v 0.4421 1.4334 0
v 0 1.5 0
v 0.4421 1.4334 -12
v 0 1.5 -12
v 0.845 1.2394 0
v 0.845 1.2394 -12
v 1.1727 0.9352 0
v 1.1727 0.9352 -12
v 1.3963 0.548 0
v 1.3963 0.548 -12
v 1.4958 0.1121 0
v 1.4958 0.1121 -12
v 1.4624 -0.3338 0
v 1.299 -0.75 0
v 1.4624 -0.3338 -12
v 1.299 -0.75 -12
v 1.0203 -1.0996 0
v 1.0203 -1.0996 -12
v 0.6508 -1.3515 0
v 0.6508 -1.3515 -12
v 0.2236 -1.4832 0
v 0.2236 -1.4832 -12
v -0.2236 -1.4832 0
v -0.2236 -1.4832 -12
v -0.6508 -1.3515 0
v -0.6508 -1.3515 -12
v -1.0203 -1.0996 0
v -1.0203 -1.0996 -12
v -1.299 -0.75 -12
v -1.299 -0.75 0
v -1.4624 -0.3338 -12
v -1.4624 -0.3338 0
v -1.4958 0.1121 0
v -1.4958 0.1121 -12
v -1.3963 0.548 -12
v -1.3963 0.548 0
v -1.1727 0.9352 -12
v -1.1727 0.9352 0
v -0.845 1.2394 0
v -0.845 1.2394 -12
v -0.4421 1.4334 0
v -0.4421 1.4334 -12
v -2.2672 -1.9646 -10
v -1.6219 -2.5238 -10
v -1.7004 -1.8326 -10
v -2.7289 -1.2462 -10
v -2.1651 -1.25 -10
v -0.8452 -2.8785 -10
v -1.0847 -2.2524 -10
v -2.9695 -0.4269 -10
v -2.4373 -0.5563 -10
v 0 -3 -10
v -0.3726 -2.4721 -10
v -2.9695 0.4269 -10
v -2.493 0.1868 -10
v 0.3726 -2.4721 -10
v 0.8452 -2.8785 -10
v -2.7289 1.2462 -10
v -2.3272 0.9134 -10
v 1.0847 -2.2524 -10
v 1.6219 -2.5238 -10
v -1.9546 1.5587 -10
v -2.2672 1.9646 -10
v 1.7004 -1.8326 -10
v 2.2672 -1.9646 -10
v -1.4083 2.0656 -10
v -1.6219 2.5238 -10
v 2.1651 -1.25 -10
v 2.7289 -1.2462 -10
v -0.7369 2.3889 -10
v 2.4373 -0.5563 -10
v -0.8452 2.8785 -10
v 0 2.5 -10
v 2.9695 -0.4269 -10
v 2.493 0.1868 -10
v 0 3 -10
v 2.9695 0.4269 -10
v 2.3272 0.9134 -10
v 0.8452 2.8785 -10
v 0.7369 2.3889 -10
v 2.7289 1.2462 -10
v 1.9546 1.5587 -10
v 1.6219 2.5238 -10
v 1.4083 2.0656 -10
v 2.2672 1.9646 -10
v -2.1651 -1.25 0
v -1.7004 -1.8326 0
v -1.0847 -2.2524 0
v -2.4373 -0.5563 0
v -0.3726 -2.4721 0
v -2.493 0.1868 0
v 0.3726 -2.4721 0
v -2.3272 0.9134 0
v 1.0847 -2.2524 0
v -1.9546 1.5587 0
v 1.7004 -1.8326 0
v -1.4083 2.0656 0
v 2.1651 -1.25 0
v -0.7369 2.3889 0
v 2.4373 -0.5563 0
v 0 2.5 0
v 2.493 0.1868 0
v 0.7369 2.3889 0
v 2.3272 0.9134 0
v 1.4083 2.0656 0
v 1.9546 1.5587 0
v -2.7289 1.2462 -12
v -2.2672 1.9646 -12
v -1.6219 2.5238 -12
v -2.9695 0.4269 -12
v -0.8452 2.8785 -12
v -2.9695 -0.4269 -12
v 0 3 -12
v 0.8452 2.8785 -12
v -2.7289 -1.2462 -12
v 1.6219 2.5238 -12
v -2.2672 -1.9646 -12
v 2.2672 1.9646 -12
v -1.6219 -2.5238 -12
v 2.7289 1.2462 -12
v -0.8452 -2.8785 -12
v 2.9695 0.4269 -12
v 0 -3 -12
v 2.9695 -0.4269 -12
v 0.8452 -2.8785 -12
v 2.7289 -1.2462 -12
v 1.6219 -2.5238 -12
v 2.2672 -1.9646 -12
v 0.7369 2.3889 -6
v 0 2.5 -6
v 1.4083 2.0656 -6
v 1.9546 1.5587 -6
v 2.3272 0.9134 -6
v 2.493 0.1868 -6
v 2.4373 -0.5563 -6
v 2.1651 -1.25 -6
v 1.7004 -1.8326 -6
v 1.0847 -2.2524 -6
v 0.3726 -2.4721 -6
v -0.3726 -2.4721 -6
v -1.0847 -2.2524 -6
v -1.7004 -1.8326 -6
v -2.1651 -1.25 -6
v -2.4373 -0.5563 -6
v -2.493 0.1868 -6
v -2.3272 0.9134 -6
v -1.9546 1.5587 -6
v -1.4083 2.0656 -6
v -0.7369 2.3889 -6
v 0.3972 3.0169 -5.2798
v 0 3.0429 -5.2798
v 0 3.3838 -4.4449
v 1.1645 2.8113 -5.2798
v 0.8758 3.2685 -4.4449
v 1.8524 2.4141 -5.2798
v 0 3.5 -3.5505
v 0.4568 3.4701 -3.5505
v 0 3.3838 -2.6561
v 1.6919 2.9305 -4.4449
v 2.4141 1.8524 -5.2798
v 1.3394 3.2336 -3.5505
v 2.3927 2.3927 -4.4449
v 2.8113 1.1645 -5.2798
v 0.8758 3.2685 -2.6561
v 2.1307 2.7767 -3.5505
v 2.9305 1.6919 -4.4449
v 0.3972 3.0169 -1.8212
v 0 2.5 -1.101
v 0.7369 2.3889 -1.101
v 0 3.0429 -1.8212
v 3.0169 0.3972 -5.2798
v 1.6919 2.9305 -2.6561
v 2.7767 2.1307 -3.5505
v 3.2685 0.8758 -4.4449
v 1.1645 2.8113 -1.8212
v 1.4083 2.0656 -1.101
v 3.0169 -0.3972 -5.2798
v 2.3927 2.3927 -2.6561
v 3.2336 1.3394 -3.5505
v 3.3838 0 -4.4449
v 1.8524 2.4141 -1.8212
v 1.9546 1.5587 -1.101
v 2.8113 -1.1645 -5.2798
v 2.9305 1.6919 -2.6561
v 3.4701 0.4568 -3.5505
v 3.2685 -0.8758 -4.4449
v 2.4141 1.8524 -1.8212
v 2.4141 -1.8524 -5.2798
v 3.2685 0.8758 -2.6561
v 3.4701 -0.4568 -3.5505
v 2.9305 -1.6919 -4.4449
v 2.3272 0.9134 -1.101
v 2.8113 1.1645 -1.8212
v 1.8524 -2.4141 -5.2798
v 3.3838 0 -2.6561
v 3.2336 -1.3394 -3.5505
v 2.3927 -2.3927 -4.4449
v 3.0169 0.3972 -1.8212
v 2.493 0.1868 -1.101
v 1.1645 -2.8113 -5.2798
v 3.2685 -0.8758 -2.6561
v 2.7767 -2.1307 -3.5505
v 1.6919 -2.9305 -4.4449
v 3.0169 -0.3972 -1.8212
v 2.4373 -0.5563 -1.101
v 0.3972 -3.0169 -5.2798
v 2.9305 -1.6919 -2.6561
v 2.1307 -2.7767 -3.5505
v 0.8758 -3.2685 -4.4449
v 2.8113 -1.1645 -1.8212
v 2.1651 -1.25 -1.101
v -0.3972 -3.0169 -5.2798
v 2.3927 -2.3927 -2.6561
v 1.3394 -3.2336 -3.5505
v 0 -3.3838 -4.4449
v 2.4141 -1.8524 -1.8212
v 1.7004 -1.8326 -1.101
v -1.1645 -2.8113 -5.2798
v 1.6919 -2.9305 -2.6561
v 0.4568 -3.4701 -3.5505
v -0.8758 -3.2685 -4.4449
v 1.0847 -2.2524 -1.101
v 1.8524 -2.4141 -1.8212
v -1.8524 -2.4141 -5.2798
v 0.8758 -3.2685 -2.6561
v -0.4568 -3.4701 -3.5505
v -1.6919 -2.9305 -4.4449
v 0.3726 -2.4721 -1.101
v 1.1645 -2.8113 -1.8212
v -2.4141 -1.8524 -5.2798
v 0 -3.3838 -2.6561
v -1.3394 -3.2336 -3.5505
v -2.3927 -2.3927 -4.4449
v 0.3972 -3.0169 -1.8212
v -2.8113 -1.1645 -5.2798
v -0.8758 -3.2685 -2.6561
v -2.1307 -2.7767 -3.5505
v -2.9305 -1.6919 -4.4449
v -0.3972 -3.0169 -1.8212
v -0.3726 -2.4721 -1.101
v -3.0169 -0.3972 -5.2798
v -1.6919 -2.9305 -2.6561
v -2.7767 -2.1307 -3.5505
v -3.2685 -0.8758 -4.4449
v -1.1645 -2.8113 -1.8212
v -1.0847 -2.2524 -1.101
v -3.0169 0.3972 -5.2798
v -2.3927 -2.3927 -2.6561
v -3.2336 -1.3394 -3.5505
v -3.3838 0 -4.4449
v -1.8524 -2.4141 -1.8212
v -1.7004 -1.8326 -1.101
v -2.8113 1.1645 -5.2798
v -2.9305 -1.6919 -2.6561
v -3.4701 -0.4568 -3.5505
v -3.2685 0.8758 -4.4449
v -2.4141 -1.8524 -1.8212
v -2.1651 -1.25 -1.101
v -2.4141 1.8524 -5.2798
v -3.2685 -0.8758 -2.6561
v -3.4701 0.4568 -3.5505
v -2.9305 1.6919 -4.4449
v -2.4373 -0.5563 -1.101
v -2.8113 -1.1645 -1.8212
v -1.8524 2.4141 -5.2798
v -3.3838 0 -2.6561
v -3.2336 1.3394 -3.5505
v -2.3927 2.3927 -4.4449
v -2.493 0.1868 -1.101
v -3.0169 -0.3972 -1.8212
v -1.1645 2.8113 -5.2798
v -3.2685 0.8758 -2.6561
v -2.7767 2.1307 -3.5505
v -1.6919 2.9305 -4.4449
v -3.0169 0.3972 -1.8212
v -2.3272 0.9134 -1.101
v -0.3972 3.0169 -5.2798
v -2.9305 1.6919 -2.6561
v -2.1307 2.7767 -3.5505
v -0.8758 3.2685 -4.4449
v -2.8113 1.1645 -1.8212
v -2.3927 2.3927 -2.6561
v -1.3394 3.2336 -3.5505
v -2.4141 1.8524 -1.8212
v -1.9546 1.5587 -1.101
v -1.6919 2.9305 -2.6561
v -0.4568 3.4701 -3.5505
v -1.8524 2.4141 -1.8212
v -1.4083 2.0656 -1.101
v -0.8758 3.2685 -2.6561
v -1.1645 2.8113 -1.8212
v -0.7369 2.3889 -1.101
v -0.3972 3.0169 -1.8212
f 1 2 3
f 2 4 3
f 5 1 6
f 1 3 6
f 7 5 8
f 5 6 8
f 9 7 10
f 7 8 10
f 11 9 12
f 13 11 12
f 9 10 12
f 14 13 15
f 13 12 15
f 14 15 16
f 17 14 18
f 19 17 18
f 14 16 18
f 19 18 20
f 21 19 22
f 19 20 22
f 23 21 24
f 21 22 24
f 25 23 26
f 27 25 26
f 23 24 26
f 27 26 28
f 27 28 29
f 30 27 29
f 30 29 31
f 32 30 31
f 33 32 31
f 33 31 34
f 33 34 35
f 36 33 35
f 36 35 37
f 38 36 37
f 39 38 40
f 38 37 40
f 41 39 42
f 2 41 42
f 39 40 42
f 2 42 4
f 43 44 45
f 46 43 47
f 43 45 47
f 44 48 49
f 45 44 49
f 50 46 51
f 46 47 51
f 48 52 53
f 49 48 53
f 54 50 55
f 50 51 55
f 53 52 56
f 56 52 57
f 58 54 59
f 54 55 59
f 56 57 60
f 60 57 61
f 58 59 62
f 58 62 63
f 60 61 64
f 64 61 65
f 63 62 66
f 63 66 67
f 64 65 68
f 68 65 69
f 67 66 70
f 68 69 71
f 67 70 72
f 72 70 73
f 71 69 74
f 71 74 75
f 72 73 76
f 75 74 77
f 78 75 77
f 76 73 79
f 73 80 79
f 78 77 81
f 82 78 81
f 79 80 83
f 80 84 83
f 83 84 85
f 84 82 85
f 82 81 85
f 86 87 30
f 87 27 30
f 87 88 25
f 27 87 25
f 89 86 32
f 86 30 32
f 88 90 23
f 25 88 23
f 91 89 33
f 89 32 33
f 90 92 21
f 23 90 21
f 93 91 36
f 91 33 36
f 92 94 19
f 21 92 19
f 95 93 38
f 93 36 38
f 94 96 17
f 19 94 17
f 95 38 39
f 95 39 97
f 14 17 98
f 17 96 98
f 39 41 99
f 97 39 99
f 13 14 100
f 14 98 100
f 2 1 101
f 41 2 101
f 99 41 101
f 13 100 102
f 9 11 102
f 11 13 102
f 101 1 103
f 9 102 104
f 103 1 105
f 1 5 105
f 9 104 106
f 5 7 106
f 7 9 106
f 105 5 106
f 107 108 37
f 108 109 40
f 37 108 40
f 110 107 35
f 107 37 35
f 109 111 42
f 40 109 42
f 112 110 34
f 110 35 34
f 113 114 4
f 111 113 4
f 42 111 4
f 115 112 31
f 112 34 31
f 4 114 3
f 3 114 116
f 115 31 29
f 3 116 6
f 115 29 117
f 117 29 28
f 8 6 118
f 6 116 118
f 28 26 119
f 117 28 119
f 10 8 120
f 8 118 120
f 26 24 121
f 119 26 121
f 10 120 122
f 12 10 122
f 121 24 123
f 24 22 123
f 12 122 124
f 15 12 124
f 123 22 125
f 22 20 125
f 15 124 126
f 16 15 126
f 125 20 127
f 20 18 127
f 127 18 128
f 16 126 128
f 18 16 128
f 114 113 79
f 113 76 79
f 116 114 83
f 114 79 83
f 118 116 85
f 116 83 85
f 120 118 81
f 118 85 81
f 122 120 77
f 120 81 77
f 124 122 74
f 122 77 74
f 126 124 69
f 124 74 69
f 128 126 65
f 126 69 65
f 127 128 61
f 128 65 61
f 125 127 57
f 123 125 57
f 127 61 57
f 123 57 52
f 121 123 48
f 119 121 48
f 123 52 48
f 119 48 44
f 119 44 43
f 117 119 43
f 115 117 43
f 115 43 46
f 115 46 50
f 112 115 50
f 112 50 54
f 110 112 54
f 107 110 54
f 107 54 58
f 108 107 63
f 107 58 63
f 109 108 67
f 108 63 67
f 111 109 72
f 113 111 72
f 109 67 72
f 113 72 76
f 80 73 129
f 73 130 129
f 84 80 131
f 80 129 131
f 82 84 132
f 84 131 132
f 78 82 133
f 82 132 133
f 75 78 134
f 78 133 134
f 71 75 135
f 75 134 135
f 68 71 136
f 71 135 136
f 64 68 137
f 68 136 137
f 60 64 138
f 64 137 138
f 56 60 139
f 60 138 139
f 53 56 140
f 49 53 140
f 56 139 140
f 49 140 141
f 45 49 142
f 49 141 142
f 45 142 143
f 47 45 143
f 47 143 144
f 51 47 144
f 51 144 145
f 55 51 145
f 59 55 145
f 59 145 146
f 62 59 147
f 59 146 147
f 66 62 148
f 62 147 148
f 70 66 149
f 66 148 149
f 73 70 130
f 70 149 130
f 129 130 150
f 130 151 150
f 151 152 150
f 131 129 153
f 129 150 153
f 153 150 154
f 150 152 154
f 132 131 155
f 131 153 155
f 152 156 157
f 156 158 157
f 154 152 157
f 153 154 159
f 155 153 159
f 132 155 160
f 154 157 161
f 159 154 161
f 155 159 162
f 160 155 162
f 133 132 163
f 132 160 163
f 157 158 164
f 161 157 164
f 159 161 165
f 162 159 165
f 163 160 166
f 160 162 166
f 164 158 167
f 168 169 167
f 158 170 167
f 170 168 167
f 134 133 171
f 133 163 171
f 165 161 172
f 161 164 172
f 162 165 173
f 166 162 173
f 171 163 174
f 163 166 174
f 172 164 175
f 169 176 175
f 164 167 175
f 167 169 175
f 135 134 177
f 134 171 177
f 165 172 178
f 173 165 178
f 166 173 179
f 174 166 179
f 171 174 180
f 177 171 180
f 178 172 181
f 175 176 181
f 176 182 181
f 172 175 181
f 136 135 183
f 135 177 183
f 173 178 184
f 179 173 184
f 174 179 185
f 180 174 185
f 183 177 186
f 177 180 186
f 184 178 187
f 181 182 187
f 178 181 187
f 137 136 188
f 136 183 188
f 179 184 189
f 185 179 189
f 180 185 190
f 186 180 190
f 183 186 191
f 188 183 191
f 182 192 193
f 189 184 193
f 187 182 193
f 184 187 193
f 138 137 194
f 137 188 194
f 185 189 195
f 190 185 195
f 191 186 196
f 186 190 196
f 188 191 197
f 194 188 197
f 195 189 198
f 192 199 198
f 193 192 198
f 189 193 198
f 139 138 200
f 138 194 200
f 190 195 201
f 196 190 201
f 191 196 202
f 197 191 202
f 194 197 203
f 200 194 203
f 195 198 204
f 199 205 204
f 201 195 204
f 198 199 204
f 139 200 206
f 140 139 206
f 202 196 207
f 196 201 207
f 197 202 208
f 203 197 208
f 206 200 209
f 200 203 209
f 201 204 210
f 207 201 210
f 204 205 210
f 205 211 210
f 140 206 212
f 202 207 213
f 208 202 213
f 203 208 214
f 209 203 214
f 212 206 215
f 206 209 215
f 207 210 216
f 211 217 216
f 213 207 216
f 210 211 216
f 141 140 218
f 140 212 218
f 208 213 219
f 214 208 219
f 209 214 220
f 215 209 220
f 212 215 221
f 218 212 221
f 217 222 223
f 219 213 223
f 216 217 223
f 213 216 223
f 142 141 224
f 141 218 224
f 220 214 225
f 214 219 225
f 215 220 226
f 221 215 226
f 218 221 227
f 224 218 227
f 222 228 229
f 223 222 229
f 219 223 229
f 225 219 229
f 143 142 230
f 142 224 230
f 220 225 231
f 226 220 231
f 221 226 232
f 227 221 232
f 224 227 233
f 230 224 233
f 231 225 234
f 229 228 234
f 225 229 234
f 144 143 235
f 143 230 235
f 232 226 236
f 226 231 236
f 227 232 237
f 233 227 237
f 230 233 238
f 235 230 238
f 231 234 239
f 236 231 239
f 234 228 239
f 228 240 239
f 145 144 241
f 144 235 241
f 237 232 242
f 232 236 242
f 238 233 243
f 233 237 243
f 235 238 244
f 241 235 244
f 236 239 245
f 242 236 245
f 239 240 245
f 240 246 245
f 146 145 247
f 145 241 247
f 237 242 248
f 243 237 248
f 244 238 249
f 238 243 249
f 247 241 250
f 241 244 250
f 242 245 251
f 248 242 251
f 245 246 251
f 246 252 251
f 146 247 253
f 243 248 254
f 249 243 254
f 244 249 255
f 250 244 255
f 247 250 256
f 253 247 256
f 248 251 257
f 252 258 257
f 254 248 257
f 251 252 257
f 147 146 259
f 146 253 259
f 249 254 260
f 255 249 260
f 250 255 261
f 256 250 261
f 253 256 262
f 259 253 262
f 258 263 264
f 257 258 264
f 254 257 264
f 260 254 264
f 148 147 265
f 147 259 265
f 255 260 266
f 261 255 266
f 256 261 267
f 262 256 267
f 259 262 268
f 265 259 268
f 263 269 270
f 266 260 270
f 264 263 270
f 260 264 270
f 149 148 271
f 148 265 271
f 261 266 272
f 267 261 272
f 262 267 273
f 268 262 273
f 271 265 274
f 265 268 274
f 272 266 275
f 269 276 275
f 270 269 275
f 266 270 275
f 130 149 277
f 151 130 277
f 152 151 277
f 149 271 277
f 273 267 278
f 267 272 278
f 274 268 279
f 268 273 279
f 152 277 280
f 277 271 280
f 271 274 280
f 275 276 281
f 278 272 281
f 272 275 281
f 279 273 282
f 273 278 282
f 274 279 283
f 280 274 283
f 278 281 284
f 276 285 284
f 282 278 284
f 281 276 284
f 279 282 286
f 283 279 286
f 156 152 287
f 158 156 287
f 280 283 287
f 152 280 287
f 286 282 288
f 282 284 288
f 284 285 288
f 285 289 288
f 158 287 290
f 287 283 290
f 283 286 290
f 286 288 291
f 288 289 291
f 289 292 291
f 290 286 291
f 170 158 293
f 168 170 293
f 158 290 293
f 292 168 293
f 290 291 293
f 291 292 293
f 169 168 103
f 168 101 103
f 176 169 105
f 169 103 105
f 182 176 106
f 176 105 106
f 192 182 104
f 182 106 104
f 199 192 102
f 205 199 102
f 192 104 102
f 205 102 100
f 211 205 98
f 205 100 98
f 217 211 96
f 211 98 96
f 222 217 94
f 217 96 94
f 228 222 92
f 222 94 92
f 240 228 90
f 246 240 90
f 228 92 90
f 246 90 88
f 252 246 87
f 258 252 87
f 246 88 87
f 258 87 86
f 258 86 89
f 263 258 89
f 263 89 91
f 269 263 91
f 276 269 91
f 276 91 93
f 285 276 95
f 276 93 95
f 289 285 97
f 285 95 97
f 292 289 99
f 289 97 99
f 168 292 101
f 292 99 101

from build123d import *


with BuildPart() as part:
    # Sketch1 → Revolve1 (revolve)
    with BuildSketch(Plane(origin=(0, 0, 0), x_dir=(0, 0, -1), z_dir=(1, 0, 0))):
        with BuildLine():
            Line((0.388232597, 1.5), (6.712787917, 1.5))
            ThreePointArc((6.712787917, 1.5), (6.400595054, 2.031506006), (6, 2.5))
            ThreePointArc((6, 2.5), (3.550510257, 3.5), (1.101020514, 2.5))
            ThreePointArc((1.101020514, 2.5), (0.700425461, 2.031506006), (0.388232597, 1.5))
        make_face()
        with BuildLine():
            Line((6.712787917, 1.5), (12, 1.5))
            Line((12, 1.5), (12, 3))
            Line((12, 3), (10, 3))
            Line((10, 3), (10, 2.5))
            Line((10, 2.5), (6, 2.5))
            ThreePointArc((6, 2.5), (6.400595054, 2.031506006), (6.712787917, 1.5))
        make_face()
        with BuildLine():
            Line((0, 1.5), (0.388232597, 1.5))
            ThreePointArc((0.388232597, 1.5), (0.700425461, 2.031506006), (1.101020514, 2.5))
            Line((1.101020514, 2.5), (0, 2.5))
            Line((0, 2.5), (0, 1.5))
        make_face()
    revolve(axis=Axis((0, 0, 0), (0, 0, -1)))


solid = part.part
